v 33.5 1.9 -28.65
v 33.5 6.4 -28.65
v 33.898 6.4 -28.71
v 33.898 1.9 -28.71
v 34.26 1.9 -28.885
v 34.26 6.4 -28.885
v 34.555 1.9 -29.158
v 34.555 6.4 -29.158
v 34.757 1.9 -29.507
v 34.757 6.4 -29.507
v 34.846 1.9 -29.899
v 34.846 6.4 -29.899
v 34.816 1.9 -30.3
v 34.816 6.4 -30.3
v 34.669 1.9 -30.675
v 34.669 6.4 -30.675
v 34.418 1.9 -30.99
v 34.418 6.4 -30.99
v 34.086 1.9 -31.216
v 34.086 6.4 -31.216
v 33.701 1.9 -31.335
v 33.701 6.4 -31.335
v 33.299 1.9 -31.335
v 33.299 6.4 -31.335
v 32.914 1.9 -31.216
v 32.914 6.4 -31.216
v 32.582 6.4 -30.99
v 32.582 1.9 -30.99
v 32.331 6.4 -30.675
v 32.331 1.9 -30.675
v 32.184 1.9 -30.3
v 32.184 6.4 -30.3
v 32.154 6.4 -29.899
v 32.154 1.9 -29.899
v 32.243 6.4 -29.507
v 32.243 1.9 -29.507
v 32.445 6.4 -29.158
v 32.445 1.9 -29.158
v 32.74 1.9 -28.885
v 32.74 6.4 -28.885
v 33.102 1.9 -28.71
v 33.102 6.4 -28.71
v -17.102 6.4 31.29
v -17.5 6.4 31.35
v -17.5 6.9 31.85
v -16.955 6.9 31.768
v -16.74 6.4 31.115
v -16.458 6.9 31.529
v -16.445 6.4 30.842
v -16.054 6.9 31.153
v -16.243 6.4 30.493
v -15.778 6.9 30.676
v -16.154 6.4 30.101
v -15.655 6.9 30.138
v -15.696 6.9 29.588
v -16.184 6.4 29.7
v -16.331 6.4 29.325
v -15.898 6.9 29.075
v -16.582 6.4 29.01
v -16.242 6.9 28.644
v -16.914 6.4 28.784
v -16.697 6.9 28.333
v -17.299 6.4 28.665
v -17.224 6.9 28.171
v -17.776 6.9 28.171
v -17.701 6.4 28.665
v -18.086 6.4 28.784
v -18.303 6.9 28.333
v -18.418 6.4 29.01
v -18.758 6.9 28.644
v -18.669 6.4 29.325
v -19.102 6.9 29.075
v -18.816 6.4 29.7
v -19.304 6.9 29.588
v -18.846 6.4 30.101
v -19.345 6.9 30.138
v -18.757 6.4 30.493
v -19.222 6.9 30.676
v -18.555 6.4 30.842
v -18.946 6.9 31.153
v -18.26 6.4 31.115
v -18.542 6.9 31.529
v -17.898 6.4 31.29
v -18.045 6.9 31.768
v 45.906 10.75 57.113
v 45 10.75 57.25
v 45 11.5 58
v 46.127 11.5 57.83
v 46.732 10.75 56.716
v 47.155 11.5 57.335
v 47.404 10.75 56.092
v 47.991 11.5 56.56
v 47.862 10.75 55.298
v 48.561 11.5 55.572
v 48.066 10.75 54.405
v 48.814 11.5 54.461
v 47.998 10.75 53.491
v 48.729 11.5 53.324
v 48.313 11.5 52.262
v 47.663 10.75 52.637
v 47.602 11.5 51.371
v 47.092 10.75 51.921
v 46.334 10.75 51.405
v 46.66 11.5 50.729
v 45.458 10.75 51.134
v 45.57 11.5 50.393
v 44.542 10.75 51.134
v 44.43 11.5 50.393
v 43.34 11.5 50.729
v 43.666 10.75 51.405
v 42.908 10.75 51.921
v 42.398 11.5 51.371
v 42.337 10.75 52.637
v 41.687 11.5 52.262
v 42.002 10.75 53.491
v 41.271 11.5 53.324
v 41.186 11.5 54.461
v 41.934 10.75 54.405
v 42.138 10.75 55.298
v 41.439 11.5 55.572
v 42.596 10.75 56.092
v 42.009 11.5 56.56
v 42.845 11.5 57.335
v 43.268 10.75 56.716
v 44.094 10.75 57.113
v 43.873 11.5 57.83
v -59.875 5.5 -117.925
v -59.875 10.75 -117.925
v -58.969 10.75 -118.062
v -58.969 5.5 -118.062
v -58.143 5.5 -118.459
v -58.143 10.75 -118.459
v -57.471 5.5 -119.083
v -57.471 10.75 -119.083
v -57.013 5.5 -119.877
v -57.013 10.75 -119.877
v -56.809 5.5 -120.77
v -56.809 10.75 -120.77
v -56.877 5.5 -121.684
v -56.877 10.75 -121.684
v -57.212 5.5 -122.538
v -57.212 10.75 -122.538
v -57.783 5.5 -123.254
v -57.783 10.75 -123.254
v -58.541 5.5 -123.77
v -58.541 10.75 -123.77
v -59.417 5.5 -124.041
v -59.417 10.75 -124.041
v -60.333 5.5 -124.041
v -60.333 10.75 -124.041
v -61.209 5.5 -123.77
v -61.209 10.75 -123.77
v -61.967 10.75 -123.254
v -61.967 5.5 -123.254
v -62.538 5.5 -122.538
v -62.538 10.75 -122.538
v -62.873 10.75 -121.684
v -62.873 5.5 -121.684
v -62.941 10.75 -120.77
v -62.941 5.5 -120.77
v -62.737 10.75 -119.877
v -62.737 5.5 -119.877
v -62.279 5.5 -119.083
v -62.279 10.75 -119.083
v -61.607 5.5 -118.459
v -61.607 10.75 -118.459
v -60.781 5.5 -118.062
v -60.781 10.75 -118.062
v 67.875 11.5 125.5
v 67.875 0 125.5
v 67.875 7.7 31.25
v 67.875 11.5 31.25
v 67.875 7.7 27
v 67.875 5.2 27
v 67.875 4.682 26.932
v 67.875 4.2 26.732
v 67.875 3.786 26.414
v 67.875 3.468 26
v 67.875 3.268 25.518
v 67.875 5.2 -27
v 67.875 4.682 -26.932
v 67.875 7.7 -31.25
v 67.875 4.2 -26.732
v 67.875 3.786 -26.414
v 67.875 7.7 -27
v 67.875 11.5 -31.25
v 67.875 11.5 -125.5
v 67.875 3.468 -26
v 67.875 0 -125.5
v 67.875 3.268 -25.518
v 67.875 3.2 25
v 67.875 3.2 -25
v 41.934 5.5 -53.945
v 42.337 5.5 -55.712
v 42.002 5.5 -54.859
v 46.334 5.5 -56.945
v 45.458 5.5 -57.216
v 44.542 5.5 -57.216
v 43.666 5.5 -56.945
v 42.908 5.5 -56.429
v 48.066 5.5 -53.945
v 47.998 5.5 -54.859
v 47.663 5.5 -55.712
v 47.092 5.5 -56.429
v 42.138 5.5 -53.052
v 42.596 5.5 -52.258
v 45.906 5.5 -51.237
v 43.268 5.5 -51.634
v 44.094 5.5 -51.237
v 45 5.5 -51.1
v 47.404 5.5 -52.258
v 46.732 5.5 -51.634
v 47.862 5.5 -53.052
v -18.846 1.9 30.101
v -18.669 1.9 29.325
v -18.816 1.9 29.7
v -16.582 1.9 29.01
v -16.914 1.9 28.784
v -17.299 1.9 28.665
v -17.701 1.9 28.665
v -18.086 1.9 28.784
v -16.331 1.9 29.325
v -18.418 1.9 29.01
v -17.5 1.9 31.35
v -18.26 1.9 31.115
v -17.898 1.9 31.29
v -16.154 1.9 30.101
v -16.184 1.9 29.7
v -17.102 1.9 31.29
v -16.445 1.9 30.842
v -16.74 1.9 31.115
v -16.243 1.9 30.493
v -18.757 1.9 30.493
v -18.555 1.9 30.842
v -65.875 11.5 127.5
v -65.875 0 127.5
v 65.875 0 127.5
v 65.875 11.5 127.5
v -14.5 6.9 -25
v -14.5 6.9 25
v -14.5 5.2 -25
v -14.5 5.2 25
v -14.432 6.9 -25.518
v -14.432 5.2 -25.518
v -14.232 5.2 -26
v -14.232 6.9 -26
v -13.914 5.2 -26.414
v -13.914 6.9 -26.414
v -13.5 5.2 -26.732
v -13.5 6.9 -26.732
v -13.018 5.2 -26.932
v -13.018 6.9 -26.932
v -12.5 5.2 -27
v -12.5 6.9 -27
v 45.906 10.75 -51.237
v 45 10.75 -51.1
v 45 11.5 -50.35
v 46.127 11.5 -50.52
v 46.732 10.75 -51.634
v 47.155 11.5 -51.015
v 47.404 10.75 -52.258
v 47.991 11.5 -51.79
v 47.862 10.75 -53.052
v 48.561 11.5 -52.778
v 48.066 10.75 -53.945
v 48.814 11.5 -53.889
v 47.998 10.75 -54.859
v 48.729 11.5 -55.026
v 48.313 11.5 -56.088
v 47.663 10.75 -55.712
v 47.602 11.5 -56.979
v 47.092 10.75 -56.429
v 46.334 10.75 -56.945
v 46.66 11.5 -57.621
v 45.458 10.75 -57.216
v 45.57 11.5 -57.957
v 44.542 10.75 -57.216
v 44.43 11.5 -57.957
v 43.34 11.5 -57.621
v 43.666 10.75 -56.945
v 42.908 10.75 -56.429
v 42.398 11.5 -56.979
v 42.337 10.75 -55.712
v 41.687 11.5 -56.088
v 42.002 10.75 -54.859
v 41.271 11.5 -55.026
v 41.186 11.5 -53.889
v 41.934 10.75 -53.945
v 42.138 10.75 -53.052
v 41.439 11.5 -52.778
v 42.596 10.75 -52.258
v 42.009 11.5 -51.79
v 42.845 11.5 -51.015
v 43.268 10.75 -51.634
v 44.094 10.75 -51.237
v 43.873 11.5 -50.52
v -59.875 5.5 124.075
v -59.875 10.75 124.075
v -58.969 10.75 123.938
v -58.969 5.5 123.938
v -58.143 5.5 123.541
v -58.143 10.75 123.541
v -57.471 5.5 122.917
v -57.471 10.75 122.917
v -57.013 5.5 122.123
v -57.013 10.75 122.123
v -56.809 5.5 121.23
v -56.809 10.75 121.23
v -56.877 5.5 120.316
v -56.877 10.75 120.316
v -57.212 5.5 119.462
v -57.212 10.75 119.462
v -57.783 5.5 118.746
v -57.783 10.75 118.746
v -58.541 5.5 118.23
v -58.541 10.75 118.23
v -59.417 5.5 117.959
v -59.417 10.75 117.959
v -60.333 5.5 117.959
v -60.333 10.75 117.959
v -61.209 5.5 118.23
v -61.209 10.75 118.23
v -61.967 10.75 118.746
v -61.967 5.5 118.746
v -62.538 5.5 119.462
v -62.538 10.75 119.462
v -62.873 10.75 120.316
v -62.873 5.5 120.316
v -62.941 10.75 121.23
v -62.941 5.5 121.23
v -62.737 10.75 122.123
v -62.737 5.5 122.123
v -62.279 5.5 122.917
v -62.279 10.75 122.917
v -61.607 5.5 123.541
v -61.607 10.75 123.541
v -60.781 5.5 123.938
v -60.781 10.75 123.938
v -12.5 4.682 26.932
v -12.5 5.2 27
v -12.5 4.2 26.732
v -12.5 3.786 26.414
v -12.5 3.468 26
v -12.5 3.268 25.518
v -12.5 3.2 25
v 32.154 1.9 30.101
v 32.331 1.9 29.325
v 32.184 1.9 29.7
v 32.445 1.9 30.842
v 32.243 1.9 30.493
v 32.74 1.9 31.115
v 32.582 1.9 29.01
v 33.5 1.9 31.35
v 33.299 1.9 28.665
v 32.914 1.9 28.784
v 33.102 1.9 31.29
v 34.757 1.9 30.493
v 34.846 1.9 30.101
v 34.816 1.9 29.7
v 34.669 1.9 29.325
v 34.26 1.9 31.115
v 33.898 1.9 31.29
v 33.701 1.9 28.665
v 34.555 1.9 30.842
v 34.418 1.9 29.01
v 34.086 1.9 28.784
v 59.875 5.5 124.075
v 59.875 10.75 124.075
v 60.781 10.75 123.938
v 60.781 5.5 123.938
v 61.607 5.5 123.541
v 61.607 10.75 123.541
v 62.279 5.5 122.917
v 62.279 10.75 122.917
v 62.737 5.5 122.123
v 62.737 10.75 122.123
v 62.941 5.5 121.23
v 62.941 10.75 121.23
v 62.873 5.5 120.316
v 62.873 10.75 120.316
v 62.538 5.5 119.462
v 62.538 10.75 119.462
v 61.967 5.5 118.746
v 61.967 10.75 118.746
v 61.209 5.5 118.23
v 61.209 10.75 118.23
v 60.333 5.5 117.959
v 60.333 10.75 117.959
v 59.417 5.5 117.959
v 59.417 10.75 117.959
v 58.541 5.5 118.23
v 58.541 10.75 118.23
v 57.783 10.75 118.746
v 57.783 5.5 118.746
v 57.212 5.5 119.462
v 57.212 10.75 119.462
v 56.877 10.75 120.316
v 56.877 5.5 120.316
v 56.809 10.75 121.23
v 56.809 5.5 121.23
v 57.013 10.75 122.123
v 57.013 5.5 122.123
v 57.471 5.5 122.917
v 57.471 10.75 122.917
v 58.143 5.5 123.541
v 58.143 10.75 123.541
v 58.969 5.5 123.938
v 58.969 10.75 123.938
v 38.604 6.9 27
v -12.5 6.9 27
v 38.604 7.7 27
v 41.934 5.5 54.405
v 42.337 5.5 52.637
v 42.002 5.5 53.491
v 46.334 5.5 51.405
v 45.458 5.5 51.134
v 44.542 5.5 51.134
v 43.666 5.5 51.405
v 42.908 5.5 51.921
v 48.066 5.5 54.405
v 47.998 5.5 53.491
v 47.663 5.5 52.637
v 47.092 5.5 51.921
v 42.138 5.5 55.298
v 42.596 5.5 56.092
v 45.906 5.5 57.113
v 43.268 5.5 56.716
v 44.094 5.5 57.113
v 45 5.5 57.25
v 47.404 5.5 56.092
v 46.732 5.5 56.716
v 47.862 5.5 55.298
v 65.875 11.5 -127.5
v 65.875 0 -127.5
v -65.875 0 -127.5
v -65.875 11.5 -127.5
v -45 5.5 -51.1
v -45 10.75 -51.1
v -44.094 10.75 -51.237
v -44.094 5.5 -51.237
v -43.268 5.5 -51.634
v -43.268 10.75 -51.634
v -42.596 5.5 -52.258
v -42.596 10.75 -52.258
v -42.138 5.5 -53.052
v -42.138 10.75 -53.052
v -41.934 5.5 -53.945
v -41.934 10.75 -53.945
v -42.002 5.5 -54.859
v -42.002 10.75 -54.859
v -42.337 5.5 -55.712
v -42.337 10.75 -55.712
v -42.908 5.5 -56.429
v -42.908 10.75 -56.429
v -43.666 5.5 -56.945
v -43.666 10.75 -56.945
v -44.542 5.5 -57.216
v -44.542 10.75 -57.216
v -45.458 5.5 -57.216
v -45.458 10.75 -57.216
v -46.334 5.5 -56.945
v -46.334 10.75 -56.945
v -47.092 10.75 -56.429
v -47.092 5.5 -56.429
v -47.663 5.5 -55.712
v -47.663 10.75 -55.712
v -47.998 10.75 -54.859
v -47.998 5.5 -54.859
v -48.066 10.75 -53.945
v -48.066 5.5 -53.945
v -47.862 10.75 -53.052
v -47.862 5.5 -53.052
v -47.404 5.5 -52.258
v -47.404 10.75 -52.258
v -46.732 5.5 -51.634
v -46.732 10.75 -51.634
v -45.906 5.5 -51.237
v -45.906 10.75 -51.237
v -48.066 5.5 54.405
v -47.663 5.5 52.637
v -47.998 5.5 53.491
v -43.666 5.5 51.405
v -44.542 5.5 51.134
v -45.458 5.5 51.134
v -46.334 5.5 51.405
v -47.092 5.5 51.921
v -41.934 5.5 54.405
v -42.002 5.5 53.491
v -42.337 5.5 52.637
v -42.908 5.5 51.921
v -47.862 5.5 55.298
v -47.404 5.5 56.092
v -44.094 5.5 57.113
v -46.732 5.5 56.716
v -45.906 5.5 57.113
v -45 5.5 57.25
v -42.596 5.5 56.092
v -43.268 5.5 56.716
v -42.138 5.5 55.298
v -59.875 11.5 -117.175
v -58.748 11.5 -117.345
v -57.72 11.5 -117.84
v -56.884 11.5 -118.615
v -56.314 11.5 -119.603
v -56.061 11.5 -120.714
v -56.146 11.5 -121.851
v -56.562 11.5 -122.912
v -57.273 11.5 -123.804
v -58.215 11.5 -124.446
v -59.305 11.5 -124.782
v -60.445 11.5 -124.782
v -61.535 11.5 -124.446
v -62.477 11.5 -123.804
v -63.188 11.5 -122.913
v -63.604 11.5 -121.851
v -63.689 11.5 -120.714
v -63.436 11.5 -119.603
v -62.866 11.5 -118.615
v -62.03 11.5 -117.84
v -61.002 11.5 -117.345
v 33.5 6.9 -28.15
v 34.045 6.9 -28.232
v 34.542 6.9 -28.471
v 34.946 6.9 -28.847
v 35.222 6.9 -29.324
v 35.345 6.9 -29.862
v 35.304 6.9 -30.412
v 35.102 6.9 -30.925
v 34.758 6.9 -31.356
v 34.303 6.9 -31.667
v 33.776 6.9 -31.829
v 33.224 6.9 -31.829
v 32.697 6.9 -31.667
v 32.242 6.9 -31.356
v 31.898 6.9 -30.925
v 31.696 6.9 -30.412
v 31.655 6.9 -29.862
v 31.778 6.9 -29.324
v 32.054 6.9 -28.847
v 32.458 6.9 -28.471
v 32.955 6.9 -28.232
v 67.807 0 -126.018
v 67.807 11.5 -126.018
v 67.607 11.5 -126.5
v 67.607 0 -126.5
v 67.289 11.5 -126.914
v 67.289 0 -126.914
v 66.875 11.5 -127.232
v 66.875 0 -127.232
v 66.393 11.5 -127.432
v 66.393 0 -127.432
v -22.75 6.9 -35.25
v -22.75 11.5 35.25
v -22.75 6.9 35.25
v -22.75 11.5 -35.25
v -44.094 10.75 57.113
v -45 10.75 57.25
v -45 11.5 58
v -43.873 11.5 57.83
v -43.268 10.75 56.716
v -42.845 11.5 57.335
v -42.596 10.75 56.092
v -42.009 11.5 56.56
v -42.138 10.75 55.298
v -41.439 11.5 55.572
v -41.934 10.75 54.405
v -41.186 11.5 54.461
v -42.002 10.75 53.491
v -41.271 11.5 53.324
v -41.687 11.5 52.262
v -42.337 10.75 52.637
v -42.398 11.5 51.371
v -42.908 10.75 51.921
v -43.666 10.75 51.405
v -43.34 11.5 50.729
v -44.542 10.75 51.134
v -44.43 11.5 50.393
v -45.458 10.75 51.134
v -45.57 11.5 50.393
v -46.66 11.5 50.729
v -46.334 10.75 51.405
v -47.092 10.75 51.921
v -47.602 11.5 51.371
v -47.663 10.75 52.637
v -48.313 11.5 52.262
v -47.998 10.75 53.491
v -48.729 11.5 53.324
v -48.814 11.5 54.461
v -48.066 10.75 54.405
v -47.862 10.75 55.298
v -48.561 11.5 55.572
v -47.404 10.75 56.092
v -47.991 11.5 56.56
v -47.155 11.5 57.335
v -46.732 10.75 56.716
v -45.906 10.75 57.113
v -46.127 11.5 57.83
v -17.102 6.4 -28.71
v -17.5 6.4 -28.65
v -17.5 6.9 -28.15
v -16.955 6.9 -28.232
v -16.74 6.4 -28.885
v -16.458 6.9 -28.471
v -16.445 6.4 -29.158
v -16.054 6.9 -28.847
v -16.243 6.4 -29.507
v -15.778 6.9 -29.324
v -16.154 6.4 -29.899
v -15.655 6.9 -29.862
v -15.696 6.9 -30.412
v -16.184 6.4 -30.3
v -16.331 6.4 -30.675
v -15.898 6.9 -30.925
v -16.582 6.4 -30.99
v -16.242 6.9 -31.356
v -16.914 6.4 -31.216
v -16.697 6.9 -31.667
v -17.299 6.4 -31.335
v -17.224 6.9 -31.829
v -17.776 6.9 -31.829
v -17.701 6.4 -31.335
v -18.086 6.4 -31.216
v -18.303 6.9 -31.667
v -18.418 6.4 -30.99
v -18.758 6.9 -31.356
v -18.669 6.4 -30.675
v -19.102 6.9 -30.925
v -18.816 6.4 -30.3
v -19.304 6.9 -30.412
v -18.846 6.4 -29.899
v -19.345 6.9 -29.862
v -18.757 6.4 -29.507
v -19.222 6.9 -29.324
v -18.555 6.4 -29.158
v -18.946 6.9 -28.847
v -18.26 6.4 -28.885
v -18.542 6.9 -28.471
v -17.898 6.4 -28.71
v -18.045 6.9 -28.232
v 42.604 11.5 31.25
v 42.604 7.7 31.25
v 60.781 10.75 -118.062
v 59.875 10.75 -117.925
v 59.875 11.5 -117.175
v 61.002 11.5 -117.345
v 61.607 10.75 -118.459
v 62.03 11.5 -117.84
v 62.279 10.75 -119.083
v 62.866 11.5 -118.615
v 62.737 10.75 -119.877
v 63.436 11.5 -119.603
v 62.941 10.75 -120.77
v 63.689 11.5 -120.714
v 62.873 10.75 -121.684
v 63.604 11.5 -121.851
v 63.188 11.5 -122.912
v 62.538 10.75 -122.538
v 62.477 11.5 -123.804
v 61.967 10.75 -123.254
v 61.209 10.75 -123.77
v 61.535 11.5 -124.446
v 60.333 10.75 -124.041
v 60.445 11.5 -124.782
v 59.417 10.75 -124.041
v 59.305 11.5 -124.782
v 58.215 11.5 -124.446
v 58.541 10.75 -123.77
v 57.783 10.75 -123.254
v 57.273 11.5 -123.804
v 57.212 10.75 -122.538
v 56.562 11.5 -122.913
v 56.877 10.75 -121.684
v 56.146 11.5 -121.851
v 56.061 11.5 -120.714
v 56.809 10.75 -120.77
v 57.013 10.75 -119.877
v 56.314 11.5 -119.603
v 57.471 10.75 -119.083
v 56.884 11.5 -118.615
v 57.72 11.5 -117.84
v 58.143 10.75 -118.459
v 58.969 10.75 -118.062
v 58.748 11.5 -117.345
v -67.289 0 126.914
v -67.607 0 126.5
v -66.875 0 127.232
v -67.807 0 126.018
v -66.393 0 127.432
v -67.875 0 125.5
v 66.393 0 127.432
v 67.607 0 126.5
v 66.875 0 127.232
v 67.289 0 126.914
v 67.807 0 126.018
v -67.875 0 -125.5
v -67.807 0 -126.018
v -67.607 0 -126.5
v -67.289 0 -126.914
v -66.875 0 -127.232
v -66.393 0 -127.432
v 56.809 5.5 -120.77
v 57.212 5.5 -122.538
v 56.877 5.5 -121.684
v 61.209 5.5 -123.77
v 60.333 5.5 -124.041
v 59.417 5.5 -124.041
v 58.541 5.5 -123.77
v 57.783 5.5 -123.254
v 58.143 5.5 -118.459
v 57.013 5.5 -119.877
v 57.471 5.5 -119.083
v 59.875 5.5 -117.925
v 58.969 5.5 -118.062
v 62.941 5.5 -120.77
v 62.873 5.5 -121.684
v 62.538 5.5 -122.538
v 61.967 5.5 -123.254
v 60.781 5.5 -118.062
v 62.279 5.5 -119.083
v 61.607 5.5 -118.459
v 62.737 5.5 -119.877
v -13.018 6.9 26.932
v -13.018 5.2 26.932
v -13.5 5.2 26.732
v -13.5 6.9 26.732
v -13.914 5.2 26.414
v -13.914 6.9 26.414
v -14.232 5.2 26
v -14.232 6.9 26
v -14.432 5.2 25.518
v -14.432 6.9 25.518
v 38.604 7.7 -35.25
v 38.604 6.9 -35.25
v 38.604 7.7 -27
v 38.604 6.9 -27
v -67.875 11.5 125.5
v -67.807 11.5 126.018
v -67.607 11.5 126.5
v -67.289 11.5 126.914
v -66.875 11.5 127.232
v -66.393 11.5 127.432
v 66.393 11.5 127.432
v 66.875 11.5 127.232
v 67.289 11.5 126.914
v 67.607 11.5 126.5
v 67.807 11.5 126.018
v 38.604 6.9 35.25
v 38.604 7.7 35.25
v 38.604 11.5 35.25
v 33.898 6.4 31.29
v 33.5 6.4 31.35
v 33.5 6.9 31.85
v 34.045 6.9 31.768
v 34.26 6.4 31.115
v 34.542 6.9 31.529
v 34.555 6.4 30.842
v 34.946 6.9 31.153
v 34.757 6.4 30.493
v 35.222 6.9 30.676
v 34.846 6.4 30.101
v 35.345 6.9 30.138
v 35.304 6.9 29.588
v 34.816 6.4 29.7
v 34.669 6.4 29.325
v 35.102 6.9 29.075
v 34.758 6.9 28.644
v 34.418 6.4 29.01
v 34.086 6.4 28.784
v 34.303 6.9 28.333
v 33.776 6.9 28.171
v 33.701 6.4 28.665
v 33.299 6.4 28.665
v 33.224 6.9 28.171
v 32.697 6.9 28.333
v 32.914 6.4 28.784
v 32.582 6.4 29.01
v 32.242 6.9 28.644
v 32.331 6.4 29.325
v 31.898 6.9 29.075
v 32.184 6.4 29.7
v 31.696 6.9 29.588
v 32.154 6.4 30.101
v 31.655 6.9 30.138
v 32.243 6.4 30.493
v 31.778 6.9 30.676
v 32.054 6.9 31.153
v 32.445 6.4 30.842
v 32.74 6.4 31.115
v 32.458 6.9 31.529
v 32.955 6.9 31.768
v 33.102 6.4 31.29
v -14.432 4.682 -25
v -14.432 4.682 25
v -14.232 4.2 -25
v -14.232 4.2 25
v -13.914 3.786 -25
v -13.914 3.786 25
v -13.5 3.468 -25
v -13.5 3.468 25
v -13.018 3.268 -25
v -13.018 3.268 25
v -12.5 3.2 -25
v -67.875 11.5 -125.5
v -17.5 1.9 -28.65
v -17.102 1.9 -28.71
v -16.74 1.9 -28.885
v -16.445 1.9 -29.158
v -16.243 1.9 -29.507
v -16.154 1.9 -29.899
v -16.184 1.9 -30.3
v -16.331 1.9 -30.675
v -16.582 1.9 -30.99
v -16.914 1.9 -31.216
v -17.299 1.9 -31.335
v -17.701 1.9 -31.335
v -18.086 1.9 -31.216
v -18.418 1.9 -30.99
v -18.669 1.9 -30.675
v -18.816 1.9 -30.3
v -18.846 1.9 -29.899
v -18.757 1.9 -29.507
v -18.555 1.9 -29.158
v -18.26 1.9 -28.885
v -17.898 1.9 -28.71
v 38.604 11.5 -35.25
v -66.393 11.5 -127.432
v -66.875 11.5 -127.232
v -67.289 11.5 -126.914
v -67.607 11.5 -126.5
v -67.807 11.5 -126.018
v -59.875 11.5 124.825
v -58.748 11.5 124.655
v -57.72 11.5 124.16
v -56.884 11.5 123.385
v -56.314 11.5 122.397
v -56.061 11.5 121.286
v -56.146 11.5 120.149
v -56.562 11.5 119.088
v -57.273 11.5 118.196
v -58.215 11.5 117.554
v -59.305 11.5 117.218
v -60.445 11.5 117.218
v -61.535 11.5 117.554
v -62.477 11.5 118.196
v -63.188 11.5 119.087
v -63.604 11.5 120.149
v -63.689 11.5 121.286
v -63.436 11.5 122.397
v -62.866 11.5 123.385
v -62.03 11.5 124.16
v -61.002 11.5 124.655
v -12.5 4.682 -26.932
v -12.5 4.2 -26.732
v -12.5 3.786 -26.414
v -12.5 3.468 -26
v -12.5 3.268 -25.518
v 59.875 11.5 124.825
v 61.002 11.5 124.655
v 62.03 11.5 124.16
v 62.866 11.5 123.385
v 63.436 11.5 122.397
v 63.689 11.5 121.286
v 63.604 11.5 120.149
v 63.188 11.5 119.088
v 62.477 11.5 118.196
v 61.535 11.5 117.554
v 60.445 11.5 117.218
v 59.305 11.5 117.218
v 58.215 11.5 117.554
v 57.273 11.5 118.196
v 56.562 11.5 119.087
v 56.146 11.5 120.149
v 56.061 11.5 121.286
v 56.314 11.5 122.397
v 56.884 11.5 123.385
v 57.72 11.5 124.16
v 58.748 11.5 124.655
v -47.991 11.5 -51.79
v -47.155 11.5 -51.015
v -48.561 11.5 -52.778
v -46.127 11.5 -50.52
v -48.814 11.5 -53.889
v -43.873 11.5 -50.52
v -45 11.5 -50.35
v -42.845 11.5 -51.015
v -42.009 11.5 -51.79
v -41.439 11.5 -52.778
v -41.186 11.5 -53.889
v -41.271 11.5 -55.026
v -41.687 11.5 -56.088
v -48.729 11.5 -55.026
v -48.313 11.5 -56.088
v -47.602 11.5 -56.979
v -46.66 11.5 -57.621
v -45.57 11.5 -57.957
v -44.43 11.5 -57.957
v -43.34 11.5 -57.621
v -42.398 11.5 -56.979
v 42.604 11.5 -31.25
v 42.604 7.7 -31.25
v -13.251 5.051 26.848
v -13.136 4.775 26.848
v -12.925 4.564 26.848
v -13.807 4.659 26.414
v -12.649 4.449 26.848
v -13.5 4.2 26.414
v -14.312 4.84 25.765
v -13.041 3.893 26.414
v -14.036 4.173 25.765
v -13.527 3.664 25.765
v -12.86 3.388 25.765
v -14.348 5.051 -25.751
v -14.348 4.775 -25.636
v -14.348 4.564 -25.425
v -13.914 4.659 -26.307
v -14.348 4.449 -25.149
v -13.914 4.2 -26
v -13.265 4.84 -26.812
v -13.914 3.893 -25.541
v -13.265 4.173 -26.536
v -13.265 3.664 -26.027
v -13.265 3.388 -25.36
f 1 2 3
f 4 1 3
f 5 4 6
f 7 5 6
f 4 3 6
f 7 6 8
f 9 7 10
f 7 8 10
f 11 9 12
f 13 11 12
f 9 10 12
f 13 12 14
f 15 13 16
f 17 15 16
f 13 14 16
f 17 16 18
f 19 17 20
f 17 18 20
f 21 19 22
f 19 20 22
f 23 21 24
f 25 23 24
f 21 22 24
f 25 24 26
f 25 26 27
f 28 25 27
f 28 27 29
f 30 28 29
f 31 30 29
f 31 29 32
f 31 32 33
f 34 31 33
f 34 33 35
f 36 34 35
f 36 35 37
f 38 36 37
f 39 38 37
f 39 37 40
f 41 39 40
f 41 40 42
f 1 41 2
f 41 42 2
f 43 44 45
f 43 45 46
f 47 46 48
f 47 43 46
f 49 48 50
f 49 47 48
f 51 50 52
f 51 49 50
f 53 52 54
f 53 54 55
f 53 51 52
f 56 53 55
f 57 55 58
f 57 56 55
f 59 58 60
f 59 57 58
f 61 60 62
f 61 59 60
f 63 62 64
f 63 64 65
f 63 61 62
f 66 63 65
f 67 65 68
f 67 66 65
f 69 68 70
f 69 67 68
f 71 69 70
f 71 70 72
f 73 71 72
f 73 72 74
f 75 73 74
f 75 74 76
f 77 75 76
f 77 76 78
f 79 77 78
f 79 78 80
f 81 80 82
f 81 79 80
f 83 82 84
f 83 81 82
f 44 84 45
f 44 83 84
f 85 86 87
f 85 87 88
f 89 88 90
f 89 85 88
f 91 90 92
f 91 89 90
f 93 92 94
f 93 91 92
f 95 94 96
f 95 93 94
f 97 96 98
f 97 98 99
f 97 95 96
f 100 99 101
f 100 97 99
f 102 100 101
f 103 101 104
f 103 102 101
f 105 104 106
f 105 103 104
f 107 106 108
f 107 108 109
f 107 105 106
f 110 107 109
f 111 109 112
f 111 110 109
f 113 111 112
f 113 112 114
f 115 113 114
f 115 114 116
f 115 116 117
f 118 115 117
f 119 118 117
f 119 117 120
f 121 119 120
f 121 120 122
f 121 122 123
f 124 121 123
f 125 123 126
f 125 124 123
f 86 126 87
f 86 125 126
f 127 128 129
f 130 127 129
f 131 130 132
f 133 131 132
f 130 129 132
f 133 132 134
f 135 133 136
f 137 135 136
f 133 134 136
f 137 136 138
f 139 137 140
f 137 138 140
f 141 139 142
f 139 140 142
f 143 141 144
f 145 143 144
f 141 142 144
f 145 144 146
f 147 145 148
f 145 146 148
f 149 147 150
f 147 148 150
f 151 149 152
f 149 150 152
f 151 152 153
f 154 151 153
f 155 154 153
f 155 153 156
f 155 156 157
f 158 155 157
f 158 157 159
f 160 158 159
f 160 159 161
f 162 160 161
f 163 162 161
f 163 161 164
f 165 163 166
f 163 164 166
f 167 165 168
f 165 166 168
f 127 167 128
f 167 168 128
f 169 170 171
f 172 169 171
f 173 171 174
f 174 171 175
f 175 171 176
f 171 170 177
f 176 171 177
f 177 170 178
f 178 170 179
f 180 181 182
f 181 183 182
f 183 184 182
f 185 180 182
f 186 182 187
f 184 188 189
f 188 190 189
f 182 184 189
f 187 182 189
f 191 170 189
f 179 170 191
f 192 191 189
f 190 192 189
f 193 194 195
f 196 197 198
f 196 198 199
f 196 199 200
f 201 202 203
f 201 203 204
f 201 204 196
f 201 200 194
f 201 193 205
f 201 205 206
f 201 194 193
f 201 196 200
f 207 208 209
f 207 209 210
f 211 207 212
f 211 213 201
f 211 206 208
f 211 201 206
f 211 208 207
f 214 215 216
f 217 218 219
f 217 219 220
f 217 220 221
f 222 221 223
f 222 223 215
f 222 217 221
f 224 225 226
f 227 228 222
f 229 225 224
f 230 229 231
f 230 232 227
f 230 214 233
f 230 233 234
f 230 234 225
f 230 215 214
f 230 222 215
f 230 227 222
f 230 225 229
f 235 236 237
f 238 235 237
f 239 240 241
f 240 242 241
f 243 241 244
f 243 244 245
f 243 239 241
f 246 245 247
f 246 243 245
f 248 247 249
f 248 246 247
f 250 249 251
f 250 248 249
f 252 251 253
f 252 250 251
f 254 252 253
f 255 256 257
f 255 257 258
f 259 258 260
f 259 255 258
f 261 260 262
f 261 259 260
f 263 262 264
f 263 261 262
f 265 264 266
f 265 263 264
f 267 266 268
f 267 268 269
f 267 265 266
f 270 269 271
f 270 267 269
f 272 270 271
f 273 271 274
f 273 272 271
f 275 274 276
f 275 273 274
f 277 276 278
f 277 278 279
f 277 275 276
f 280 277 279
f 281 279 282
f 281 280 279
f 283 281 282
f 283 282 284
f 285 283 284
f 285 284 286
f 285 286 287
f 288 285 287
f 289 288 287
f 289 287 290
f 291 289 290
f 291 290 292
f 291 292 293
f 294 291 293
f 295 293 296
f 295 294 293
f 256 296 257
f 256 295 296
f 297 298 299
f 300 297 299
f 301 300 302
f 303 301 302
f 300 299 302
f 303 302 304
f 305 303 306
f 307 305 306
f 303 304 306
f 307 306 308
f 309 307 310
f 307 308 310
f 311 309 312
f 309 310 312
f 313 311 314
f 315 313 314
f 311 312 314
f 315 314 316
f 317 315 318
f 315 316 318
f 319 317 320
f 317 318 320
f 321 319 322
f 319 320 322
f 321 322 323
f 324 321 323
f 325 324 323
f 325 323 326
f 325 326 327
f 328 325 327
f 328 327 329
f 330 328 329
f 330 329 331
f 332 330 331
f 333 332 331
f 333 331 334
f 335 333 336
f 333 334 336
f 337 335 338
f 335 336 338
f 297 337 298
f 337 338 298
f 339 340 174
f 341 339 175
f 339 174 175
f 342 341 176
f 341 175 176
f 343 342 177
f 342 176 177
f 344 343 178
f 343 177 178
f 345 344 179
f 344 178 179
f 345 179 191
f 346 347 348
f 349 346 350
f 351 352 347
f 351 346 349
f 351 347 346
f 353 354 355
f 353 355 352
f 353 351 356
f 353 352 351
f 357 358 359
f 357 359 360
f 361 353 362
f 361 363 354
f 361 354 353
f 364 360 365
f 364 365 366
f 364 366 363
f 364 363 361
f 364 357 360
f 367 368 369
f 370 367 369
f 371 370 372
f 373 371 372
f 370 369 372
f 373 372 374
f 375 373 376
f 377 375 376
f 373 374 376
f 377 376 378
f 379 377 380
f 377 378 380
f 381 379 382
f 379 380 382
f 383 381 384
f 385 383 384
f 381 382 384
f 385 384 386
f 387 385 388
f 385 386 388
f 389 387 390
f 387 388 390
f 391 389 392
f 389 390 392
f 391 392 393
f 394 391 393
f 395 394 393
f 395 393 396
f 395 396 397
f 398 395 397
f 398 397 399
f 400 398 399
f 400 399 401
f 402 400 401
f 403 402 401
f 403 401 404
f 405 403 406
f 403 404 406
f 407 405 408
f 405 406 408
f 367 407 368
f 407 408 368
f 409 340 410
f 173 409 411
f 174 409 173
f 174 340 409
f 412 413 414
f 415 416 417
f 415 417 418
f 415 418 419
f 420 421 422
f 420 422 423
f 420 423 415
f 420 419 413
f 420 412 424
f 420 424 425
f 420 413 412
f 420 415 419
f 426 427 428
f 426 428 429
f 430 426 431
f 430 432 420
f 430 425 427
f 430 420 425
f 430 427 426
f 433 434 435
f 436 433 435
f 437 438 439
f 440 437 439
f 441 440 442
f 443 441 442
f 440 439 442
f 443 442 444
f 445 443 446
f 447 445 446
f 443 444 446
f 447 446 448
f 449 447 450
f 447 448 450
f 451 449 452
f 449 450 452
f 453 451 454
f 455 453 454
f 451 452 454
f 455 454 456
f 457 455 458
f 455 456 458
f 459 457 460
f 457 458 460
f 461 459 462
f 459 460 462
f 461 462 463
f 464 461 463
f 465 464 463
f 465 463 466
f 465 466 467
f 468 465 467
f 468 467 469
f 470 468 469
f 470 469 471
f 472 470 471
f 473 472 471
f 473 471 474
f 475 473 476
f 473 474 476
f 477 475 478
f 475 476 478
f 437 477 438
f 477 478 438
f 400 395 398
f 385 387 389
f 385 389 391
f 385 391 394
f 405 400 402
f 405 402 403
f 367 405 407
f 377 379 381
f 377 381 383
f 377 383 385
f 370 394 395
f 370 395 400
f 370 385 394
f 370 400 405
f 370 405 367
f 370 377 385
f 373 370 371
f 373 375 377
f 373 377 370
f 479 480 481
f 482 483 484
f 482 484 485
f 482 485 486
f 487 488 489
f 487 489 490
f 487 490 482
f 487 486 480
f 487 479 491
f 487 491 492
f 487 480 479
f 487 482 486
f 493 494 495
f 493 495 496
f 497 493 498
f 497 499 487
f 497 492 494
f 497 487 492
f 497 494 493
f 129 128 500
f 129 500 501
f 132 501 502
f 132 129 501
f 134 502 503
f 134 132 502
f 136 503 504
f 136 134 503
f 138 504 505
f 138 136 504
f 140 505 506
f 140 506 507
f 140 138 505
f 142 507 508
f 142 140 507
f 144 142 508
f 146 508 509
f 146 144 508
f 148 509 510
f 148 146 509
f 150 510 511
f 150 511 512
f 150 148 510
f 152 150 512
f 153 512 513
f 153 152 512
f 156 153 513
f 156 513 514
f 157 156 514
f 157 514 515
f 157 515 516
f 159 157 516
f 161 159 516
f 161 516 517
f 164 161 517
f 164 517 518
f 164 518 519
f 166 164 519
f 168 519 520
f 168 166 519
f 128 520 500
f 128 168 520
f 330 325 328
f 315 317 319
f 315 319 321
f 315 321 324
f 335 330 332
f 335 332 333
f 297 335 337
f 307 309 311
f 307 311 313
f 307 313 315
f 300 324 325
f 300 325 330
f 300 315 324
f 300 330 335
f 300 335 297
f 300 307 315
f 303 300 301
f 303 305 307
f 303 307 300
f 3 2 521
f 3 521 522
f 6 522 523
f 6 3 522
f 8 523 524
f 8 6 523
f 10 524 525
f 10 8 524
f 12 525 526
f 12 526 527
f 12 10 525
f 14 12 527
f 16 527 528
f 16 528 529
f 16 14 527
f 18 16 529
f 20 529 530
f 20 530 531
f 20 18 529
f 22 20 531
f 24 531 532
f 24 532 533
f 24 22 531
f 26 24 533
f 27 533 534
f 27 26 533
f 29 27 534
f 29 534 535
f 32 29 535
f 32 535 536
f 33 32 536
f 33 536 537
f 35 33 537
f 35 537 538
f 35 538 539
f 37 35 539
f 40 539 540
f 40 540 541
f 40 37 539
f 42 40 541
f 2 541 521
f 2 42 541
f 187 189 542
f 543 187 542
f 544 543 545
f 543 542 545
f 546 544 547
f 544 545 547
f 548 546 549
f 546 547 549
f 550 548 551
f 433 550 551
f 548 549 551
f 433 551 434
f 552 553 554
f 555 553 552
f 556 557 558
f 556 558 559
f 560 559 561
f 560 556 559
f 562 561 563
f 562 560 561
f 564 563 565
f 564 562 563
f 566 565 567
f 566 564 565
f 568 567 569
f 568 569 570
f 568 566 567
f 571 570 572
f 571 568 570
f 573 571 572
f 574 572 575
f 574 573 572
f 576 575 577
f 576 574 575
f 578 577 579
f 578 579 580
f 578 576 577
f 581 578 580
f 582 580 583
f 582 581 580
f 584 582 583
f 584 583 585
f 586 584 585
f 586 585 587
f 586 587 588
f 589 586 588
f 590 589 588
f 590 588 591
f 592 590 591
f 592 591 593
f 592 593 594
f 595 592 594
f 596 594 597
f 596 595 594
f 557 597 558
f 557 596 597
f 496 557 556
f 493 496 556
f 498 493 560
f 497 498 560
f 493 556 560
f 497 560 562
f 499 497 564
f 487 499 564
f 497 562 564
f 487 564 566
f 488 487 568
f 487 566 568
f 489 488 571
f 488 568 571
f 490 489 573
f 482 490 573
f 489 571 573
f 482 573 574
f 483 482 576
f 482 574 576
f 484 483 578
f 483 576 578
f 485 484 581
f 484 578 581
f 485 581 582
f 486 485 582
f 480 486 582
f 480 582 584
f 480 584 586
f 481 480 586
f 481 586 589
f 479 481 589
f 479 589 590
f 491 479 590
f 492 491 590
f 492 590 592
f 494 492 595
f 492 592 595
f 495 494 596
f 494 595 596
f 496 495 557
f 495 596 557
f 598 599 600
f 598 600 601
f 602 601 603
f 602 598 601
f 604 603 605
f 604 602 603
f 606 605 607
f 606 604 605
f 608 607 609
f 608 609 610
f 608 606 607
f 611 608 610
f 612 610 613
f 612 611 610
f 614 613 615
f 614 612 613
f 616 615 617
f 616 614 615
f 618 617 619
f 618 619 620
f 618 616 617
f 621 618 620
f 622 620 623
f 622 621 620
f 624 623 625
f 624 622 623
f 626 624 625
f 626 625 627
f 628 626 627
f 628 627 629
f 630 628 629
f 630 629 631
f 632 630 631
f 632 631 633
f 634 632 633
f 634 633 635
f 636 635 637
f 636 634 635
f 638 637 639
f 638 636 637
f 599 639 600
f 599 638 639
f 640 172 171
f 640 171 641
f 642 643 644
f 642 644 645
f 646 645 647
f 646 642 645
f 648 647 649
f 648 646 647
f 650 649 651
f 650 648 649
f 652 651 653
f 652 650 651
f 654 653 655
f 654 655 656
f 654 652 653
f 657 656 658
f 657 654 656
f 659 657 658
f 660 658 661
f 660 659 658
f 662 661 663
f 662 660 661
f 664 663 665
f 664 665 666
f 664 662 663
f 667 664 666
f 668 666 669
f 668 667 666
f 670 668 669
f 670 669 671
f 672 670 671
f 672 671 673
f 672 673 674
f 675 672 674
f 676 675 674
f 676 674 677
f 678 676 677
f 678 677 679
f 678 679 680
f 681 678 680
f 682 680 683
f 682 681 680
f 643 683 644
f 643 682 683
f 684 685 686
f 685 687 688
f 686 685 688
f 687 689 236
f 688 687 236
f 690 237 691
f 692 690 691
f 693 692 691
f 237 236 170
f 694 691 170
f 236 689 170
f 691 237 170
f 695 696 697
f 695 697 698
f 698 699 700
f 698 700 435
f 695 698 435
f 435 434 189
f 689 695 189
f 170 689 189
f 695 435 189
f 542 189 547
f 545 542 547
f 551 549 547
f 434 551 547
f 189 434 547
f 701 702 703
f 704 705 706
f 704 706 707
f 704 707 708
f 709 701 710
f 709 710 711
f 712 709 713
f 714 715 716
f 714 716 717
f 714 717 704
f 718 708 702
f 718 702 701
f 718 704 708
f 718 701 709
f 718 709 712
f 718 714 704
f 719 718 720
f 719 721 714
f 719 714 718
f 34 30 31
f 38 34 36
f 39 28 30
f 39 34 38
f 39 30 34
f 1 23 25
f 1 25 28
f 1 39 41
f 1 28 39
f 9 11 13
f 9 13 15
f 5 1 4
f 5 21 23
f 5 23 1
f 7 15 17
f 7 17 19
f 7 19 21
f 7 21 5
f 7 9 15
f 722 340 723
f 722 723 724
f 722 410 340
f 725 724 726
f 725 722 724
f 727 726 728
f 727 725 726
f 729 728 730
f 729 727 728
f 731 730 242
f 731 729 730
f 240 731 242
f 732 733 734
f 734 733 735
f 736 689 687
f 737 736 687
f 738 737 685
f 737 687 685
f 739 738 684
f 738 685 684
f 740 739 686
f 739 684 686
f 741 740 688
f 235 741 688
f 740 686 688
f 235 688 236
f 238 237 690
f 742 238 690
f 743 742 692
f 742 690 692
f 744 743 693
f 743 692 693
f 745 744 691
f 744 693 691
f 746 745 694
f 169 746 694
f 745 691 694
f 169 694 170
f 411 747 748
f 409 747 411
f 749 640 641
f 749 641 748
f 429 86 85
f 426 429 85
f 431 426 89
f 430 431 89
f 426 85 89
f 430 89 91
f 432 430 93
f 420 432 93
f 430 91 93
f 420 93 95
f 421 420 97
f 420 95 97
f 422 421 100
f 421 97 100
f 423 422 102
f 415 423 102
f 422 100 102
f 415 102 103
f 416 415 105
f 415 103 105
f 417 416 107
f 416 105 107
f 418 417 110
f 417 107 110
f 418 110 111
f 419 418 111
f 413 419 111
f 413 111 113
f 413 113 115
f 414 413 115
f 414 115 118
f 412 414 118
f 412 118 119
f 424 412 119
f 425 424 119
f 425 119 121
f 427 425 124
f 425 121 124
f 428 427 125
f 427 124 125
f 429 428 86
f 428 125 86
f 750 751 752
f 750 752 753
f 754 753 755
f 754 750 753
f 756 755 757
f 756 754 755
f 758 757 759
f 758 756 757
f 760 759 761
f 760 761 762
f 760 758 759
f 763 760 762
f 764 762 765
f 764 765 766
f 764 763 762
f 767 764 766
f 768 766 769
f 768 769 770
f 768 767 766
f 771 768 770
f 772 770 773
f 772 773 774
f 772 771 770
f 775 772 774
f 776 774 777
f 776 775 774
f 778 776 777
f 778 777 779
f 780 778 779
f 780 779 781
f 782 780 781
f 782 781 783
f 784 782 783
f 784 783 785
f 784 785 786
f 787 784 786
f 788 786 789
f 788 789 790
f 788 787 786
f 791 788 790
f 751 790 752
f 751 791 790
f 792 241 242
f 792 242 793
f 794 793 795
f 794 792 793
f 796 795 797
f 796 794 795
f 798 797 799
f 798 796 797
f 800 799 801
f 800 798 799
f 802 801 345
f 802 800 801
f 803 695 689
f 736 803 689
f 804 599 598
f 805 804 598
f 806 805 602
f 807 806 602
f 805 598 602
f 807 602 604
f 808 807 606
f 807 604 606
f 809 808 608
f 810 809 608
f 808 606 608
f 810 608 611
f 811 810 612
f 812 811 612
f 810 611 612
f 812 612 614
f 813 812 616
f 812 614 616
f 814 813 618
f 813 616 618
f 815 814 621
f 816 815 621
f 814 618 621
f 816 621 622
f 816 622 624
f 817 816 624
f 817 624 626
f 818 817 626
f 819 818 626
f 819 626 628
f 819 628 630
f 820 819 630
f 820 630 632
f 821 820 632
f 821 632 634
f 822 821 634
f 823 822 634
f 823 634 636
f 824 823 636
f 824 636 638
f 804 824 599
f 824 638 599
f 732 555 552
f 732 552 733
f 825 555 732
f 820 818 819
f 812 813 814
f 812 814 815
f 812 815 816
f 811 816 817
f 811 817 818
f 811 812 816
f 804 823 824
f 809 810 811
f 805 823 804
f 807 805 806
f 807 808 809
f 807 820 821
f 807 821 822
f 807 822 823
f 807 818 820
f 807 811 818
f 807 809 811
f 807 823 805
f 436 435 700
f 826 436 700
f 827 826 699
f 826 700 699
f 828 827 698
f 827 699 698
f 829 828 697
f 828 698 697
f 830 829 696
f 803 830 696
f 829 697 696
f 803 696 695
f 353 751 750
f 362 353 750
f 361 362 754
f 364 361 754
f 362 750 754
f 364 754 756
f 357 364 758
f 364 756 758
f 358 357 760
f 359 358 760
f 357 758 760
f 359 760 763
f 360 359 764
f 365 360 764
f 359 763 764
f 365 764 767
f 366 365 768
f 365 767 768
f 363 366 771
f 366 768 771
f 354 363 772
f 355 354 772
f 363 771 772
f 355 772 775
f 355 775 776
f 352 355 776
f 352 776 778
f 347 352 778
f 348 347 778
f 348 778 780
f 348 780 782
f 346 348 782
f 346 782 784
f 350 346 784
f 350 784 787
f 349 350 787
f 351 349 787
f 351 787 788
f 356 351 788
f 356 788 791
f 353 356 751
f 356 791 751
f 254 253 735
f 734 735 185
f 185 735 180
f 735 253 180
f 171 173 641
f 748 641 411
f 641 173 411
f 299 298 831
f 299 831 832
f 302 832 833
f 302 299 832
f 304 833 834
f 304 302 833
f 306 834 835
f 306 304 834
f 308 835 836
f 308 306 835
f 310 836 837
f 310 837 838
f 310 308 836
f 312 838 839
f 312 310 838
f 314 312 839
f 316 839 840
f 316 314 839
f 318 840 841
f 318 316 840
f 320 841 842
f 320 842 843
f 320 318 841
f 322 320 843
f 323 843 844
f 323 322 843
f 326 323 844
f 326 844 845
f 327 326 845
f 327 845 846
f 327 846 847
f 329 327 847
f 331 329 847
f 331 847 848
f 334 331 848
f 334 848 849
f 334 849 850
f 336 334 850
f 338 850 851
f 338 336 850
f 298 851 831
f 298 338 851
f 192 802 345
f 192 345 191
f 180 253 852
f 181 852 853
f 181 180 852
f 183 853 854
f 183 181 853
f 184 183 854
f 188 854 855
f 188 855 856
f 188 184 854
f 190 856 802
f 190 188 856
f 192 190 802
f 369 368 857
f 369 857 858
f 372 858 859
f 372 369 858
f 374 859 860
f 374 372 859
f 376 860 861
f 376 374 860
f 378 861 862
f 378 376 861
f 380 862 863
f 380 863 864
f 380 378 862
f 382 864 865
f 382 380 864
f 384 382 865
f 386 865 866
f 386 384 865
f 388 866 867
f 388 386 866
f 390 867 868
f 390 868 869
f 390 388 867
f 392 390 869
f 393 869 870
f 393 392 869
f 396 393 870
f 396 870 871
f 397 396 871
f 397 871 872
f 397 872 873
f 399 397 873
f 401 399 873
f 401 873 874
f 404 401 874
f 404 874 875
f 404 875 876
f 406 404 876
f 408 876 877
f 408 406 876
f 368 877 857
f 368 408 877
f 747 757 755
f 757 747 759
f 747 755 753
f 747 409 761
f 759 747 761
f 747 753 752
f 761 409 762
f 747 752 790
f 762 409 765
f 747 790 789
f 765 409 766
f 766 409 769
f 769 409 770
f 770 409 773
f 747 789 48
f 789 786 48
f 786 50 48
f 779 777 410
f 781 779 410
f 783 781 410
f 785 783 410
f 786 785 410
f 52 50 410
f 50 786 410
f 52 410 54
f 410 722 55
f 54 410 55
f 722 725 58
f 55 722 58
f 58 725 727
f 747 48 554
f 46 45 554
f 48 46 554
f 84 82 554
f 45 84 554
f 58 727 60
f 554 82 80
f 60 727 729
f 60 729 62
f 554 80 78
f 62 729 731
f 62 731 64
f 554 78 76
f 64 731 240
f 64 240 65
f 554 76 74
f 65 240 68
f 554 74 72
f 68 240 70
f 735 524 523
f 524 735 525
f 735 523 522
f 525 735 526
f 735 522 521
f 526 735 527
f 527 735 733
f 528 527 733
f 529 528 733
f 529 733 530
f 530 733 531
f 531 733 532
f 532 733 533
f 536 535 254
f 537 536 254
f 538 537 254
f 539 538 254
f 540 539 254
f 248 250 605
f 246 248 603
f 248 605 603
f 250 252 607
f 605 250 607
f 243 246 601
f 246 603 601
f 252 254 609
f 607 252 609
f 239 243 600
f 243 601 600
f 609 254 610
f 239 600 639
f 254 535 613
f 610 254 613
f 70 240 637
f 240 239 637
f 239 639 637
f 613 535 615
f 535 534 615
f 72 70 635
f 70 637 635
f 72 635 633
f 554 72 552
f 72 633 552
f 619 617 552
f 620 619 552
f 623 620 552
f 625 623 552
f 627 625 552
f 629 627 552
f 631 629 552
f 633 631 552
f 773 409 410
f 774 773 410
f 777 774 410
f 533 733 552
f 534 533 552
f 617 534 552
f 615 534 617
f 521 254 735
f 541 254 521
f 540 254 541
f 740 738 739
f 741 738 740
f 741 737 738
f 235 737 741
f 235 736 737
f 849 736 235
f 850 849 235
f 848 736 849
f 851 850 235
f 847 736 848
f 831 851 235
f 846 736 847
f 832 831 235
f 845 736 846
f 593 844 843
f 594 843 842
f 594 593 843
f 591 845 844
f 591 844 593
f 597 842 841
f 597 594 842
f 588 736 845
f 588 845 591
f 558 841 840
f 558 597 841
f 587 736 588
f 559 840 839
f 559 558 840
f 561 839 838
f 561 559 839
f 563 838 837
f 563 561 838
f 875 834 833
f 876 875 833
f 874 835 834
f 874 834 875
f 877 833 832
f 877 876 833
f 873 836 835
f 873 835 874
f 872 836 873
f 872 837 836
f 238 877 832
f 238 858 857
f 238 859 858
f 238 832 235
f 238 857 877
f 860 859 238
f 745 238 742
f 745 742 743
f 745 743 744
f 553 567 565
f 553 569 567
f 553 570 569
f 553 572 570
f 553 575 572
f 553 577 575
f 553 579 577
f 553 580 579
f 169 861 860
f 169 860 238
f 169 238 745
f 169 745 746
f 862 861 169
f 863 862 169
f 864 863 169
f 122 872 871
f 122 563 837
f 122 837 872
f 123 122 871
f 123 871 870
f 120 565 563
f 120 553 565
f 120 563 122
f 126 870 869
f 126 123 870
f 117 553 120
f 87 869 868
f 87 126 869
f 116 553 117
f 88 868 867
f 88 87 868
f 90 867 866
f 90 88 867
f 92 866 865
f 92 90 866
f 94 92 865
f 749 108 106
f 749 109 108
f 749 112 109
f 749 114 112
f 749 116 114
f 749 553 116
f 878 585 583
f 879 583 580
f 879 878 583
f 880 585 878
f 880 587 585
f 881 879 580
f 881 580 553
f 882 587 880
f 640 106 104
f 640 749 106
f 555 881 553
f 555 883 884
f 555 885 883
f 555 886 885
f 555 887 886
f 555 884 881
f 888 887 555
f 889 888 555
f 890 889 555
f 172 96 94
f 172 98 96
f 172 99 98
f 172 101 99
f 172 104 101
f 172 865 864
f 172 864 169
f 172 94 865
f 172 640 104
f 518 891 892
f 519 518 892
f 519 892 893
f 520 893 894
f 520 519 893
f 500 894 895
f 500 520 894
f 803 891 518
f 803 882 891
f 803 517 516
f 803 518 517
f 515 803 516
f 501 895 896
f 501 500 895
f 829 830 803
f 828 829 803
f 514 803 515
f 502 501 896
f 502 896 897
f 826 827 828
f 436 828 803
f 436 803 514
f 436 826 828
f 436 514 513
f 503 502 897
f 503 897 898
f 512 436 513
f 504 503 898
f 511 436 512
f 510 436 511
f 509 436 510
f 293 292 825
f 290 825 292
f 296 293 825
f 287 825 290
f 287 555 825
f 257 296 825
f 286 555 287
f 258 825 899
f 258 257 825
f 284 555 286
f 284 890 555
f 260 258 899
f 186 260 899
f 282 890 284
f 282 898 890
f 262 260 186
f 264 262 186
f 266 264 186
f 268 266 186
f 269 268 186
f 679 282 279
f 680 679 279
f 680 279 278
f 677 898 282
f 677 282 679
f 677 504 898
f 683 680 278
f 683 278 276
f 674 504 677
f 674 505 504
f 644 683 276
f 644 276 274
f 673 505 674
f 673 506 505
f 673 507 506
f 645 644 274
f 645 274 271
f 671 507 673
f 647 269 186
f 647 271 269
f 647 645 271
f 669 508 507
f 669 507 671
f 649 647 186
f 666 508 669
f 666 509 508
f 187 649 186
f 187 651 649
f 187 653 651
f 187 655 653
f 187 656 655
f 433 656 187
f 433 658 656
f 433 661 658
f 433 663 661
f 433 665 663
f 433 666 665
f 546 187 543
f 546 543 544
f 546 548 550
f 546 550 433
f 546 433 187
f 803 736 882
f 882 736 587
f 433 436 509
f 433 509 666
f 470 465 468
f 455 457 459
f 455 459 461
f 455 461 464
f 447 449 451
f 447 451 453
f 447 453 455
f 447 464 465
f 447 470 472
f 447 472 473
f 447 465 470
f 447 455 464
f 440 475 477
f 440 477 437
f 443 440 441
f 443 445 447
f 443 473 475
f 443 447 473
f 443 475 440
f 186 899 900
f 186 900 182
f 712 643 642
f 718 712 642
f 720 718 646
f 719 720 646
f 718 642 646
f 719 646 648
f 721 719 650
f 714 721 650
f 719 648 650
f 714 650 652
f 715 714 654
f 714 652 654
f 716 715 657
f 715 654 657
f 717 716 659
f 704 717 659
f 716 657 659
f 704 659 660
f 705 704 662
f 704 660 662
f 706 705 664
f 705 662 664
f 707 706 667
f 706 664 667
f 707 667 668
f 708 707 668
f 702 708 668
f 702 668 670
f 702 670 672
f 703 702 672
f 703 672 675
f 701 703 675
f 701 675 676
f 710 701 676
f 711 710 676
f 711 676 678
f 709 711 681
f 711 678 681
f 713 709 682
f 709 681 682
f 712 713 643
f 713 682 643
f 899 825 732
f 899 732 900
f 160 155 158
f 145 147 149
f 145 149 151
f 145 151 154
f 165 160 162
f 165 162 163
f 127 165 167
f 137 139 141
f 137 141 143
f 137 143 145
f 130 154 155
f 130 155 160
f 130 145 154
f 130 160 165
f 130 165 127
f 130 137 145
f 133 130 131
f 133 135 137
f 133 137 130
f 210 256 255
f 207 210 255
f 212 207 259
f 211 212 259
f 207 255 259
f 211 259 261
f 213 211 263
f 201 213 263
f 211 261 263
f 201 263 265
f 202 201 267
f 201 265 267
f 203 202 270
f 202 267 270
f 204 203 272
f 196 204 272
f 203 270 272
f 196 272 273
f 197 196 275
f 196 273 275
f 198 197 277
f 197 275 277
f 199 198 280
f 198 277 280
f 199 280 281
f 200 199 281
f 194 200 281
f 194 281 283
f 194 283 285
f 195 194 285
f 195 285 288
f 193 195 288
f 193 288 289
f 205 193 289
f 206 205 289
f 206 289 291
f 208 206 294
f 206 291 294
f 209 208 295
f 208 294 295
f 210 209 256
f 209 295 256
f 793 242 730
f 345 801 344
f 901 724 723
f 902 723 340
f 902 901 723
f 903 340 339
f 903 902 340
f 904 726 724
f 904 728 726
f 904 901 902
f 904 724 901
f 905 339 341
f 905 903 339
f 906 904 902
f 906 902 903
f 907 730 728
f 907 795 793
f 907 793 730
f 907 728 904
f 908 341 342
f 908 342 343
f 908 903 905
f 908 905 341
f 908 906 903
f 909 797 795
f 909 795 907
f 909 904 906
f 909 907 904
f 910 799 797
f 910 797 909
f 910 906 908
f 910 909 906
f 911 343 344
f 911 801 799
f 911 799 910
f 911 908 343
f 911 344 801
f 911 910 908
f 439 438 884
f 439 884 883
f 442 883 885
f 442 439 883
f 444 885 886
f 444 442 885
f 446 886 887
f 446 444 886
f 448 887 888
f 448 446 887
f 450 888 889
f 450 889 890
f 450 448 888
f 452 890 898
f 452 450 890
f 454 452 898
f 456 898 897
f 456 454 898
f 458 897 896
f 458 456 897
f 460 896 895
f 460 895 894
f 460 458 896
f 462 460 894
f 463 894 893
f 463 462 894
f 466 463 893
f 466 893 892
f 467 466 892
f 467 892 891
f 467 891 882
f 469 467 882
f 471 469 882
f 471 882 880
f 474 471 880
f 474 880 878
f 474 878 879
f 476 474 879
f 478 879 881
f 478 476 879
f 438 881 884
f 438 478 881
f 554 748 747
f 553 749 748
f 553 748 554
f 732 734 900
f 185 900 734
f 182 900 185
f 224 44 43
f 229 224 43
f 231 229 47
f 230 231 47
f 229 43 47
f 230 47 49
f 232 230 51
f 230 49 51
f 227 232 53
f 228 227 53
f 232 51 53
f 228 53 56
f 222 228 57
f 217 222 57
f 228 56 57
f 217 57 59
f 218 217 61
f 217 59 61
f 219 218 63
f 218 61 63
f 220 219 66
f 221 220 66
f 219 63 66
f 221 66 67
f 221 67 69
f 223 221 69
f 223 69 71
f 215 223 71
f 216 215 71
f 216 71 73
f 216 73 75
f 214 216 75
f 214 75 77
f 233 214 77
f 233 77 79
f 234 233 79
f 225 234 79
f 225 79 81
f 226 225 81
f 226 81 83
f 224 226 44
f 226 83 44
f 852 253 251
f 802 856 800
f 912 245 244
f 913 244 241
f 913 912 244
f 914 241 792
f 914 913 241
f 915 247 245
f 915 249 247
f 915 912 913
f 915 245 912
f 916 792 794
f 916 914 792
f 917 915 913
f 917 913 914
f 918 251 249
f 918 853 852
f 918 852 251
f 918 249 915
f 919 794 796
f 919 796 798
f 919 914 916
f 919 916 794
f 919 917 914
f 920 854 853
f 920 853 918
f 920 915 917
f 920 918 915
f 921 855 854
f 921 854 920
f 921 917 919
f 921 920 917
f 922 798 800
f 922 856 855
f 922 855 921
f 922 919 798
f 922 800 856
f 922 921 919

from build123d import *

# Parameters (mm, degrees)
BOSS_EXTRUDE1_DEPTH     = 11.5
SKETCH4_R               = 3.075
CUT_EXTRUDE1_DEPTH      = 6
CUT_EXTRUDE6_DEPTH      = 4.6
CUT_EXTRUDE3_DEPTH      = 145.605932192
CUT_EXTRUDE3_DEPTH_BACK = 3.7
SKETCH24_W              = 82.375
SKETCH24_H              = 54
SKETCH25_R              = 1.35
CUT_EXTRUDE4_DEPTH      = 5
CHAMFER4_SIZE           = 0.5
FILLET1_R               = 2
BOSS_EXTRUDE2_DEPTH     = 0.8
CHAMFER5_SIZE           = 0.75


with BuildPart() as part:
    # Sketch1 → Boss-Extrude1 (new body)
    with BuildSketch(Plane(origin=(0, 0, 0), x_dir=(1, 0, 0), z_dir=(0, 1, 0))):
        with BuildLine():
            Line((-67.875, 112.5), (-67.875, -112.5))
            Line((-67.875, -112.5), (-67.875, -125.5))
            ThreePointArc((-67.875, -125.5), (-67.289213562, -126.914213562), (-65.875, -127.5))
            Line((-65.875, -127.5), (65.875, -127.5))
            ThreePointArc((65.875, -127.5), (67.289213562, -126.914213562), (67.875, -125.5))
            Line((67.875, -125.5), (67.875, -112.5))
            Line((67.875, -112.5), (67.875, 112.5))
            Line((67.875, 112.5), (67.875, 125.5))
            ThreePointArc((67.875, 125.5), (67.289213562, 126.914213562), (65.875, 127.5))
            Line((65.875, 127.5), (-65.875, 127.5))
            ThreePointArc((-65.875, 127.5), (-67.289213562, 126.914213562), (-67.875, 125.5))
            Line((-67.875, 125.5), (-67.875, 112.5))
        make_face()
    extrude(amount=BOSS_EXTRUDE1_DEPTH)

    # Sketch4 → Cut-Extrude1 (cut)
    with BuildSketch(Plane(origin=(0, 11.5, 0), x_dir=(1, 0, 0), z_dir=(0, 1, 0))):
        with Locations(Location((-59.875, -121, 0), (0, 0, 270))):
            Circle(SKETCH4_R)
        with Locations(Location((59.875, -121, 0), (0, 0, 270))):
            Circle(SKETCH4_R)
        with Locations(Location((59.875, 121, 0), (0, 0, 270))):
            Circle(SKETCH4_R)
        with Locations(Location((-59.875, 121, 0), (0, 0, 270))):
            Circle(SKETCH4_R)
        with Locations(Location((45, -54.175, 0), (0, 0, 270))):
            Circle(SKETCH4_R)
        with Locations(Location((-45, -54.175, 0), (0, 0, 270))):
            Circle(SKETCH4_R)
        with Locations(Location((45, 54.175, 0), (0, 0, 270))):
            Circle(SKETCH4_R)
        with Locations(Location((-45, 54.175, 0), (0, 0, 270))):
            Circle(SKETCH4_R)
    extrude(amount=-CUT_EXTRUDE1_DEPTH, mode=Mode.SUBTRACT)

    # Sketch21 → Cut-Extrude6 (cut)
    with BuildSketch(Plane(origin=(0, 11.5, 0), x_dir=(1, 0, 0), z_dir=(0, 1, 0))):
        Polygon((67.875, 31), (67.875, -31), (67.875, -31.25), (42.603553391, -31.25), (38.603553391, -35.25), (-22.75, -35.25), (-22.75, 35.25), (38.603553391, 35.25), (42.603553391, 31.25), (67.875, 31.25), align=None)
    extrude(amount=-CUT_EXTRUDE6_DEPTH, mode=Mode.SUBTRACT)

    # Sketch24 → Cut-Extrude3 (cut, two sides: drawn at the far end of the back side and taken through both)
    with BuildSketch(Plane(origin=(0, 6.9, 0), x_dir=(1, 0, 0), z_dir=(0, 1, 0)).offset(-CUT_EXTRUDE3_DEPTH_BACK)):
        with Locations((26.6875, 0)):
            Rectangle(SKETCH24_W, SKETCH24_H)
    extrude(amount=CUT_EXTRUDE3_DEPTH + CUT_EXTRUDE3_DEPTH_BACK, mode=Mode.SUBTRACT)

    # Sketch25 → Cut-Extrude4 (cut)
    with BuildSketch(Plane(origin=(0, 6.9, 0), x_dir=(1, 0, 0), z_dir=(0, 1, 0))):
        with Locations(Location((33.5, 30, 0), (0, 0, 270))):
            Circle(SKETCH25_R)
        with Locations(Location((-17.5, 30, 0), (0, 0, 270))):
            Circle(SKETCH25_R)
        with Locations(Location((33.5, -30, 0), (0, 0, 270))):
            Circle(SKETCH25_R)
        with Locations(Location((-17.5, -30, 0), (0, 0, 270))):
            Circle(SKETCH25_R)
    extrude(amount=-CUT_EXTRUDE4_DEPTH, mode=Mode.SUBTRACT)

    # Chamfer4
    chamfer4_edges = [part.edges().sort_by_distance(p)[0] for p in [
        (-17.5, 6.9, -31.35),
        (33.5, 6.9, 28.65),
        (-17.5, 6.9, 28.65),
        (33.5, 6.9, -31.35),
    ]]
    chamfer(chamfer4_edges, length=CHAMFER4_SIZE)

    # Fillet1
    fillet1_edges = [part.edges().sort_by_distance(p)[0] for p in [
        (26.6875, 3.2, -27),
        (-14.5, 5.05, -27),
        (-14.5, 3.2, 0),
        (-14.5, 5.05, 27),
        (26.6875, 3.2, 27),
    ]]
    fillet(fillet1_edges, radius=FILLET1_R)

    # Sketch26 → Boss-Extrude2 (add)
    with BuildSketch(Plane(origin=(0, 6.9, 0), x_dir=(1, 0, 0), z_dir=(0, 1, 0))):
        Polygon((38.603553391, 35.25), (38.603553391, 27), (67.875, 27), (67.875, 31.25), (42.603553391, 31.25), align=None)
        Polygon((42.603553391, -31.25), (38.603553391, -35.25), (38.603553391, -27), (67.875, -27), (67.875, -31.25), align=None)
    extrude(amount=BOSS_EXTRUDE2_DEPTH)

    # Chamfer5
    chamfer5_edges = [part.edges().sort_by_distance(p)[0] for p in [
        (59.875, 11.5, 117.925),
        (59.875, 11.5, -124.075),
        (45, 11.5, 51.1),
        (-45, 11.5, 51.1),
        (-45, 11.5, -57.25),
        (45, 11.5, -57.25),
        (-59.875, 11.5, -124.075),
        (-59.875, 11.5, 117.925),
    ]]
    chamfer(chamfer5_edges, length=CHAMFER5_SIZE)


solid = part.part
